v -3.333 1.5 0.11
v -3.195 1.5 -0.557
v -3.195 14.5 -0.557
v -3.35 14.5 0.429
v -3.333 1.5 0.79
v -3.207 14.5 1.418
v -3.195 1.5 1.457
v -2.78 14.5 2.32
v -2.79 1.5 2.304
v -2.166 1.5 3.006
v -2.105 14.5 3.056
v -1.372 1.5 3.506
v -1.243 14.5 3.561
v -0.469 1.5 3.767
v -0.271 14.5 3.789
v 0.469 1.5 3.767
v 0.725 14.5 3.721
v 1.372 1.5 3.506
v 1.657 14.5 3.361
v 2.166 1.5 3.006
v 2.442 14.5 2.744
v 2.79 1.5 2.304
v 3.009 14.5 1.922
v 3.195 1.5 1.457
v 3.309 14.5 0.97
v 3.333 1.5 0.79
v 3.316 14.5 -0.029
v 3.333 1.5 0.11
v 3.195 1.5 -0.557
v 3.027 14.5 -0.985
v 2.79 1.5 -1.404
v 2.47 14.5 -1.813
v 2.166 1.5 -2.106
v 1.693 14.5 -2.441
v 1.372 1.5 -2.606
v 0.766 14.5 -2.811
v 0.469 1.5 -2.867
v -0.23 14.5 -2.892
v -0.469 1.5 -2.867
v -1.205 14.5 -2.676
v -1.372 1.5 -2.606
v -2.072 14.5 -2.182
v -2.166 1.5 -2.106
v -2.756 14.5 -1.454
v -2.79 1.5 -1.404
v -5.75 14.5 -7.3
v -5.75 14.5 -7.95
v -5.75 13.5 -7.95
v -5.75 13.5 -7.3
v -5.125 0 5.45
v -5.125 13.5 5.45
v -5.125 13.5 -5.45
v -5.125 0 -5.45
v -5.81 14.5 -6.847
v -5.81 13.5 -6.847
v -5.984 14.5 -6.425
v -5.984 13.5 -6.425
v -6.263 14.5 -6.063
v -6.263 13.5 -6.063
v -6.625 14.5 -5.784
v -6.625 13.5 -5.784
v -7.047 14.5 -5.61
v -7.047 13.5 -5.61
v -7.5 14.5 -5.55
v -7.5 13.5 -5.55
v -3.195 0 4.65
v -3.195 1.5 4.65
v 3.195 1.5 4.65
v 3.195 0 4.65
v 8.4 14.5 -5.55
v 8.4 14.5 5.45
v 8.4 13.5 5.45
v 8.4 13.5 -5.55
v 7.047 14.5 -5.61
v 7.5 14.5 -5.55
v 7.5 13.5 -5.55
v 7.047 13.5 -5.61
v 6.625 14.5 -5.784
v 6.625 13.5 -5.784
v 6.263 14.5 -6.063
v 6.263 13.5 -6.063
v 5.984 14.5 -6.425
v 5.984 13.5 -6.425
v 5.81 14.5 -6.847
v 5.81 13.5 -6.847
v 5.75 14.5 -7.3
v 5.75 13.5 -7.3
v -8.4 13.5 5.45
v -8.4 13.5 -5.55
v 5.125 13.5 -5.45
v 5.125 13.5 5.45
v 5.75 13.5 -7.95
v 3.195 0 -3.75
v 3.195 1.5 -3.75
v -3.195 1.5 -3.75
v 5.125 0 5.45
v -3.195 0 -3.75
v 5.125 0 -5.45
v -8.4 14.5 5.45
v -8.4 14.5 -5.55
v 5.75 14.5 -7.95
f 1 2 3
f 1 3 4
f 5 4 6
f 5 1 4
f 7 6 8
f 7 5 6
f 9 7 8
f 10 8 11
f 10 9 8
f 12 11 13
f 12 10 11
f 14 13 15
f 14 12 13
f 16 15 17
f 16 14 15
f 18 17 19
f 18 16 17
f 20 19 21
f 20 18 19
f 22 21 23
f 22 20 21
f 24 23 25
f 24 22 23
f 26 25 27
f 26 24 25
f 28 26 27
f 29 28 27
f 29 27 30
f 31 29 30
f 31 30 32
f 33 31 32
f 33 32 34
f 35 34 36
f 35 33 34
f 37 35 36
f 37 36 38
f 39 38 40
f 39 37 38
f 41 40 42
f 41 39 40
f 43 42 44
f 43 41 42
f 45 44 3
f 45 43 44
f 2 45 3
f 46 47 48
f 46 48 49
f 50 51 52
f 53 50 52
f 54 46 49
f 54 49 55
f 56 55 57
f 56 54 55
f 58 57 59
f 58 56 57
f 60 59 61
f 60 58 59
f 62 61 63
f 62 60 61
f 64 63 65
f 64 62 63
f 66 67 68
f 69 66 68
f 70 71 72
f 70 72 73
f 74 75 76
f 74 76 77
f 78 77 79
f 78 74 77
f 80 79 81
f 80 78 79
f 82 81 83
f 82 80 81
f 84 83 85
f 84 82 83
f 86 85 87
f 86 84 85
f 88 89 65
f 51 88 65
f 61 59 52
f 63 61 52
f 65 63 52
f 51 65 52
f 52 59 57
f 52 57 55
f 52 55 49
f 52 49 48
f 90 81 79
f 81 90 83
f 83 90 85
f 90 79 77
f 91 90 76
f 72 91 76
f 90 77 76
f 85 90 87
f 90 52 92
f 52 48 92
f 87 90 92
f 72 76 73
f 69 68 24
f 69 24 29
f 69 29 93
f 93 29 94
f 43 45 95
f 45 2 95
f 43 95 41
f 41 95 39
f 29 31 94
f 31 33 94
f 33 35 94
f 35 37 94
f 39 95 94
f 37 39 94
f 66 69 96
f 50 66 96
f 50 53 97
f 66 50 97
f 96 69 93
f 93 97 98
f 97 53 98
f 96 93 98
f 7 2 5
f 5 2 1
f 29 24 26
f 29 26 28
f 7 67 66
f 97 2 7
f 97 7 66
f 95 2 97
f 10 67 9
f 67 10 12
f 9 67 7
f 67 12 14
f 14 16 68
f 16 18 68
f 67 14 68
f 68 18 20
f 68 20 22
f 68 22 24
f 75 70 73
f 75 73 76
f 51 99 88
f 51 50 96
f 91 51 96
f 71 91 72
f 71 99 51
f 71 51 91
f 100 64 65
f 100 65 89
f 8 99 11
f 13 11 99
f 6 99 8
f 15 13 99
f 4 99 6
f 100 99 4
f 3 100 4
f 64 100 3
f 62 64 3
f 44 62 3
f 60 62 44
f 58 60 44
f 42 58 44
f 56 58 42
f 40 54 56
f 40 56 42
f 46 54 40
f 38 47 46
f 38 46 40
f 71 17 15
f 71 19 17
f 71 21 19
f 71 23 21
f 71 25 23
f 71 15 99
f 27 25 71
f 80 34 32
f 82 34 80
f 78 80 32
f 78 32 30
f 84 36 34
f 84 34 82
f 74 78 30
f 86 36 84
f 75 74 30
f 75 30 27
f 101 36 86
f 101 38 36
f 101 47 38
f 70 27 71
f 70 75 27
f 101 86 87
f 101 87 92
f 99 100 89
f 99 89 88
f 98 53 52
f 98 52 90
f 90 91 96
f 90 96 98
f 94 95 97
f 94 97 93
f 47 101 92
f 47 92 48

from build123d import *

# Parameters (mm, degrees)
SKETCH1_W           = 10.25
SKETCH1_H           = 10.9
BOSS_EXTRUDE1_DEPTH = 1.5
SKETCH2_W           = 6.39
SKETCH2_H           = 8.4
CUT_EXTRUDE1_DEPTH  = 8.630080275
SKETCH3_W           = 10.25
SKETCH3_H           = 10.9
SKETCH3_R           = 3.35
BOSS_EXTRUDE2_DEPTH = 13
BOSS_EXTRUDE3_DEPTH = 1


with BuildPart() as part:
    # Sketch1 → Boss-Extrude1 (new body)
    with BuildSketch(Plane(origin=(0, 0, 0), x_dir=(1, 0, 0), z_dir=(0, 1, 0))):
        Rectangle(SKETCH1_W, SKETCH1_H)
    extrude(amount=BOSS_EXTRUDE1_DEPTH)

    # Sketch2 → Cut-Extrude1 (cut, through all)
    with BuildSketch(Plane(origin=(0, 1.5, 0), x_dir=(1, 0, 0), z_dir=(0, 1, 0))):
        with Locations((0, -0.45)):
            Rectangle(SKETCH2_W, SKETCH2_H)
    extrude(amount=-CUT_EXTRUDE1_DEPTH, mode=Mode.SUBTRACT)

    # Sketch3 → Boss-Extrude2 (add)
    with BuildSketch(Plane(origin=(0, 1.5, 0), x_dir=(1, 0, 0), z_dir=(0, 1, 0))):
        Rectangle(SKETCH3_W, SKETCH3_H)
        with Locations(Location((0, -0.45, 0), (0, 0, 162.502742528))):
            Circle(SKETCH3_R, mode=Mode.SUBTRACT)
    extrude(amount=BOSS_EXTRUDE2_DEPTH)

    # Sketch5 → Boss-Extrude3 (add)
    with BuildSketch(Plane(origin=(0, 14.5, 0), x_dir=(1, 0, 0), z_dir=(0, 1, 0))):
        with BuildLine():
            Line((-5.75, 7.95), (-5.75, 7.3))
            ThreePointArc((-5.75, 7.3), (-6.262563133, 6.062563133), (-7.5, 5.55))
            Line((-7.5, 5.55), (-8.4, 5.55))
            Line((-8.4, 5.55), (-8.4, -5.45))
            Line((-8.4, -5.45), (-5.125, -5.45))
            Line((-5.125, -5.45), (-5.125, 5.45))
            Line((-5.125, 5.45), (5.125, 5.45))
            Line((5.125, 5.45), (5.125, -5.45))
            Line((5.125, -5.45), (8.4, -5.45))
            Line((8.4, -5.45), (8.4, 5.55))
            Line((8.4, 5.55), (7.5, 5.55))
            ThreePointArc((7.5, 5.55), (6.262563133, 6.062563133), (5.75, 7.3))
            Line((5.75, 7.3), (5.75, 7.95))
            Line((5.75, 7.95), (-5.75, 7.95))
        make_face()
    extrude(amount=-BOSS_EXTRUDE3_DEPTH)


solid = part.part
